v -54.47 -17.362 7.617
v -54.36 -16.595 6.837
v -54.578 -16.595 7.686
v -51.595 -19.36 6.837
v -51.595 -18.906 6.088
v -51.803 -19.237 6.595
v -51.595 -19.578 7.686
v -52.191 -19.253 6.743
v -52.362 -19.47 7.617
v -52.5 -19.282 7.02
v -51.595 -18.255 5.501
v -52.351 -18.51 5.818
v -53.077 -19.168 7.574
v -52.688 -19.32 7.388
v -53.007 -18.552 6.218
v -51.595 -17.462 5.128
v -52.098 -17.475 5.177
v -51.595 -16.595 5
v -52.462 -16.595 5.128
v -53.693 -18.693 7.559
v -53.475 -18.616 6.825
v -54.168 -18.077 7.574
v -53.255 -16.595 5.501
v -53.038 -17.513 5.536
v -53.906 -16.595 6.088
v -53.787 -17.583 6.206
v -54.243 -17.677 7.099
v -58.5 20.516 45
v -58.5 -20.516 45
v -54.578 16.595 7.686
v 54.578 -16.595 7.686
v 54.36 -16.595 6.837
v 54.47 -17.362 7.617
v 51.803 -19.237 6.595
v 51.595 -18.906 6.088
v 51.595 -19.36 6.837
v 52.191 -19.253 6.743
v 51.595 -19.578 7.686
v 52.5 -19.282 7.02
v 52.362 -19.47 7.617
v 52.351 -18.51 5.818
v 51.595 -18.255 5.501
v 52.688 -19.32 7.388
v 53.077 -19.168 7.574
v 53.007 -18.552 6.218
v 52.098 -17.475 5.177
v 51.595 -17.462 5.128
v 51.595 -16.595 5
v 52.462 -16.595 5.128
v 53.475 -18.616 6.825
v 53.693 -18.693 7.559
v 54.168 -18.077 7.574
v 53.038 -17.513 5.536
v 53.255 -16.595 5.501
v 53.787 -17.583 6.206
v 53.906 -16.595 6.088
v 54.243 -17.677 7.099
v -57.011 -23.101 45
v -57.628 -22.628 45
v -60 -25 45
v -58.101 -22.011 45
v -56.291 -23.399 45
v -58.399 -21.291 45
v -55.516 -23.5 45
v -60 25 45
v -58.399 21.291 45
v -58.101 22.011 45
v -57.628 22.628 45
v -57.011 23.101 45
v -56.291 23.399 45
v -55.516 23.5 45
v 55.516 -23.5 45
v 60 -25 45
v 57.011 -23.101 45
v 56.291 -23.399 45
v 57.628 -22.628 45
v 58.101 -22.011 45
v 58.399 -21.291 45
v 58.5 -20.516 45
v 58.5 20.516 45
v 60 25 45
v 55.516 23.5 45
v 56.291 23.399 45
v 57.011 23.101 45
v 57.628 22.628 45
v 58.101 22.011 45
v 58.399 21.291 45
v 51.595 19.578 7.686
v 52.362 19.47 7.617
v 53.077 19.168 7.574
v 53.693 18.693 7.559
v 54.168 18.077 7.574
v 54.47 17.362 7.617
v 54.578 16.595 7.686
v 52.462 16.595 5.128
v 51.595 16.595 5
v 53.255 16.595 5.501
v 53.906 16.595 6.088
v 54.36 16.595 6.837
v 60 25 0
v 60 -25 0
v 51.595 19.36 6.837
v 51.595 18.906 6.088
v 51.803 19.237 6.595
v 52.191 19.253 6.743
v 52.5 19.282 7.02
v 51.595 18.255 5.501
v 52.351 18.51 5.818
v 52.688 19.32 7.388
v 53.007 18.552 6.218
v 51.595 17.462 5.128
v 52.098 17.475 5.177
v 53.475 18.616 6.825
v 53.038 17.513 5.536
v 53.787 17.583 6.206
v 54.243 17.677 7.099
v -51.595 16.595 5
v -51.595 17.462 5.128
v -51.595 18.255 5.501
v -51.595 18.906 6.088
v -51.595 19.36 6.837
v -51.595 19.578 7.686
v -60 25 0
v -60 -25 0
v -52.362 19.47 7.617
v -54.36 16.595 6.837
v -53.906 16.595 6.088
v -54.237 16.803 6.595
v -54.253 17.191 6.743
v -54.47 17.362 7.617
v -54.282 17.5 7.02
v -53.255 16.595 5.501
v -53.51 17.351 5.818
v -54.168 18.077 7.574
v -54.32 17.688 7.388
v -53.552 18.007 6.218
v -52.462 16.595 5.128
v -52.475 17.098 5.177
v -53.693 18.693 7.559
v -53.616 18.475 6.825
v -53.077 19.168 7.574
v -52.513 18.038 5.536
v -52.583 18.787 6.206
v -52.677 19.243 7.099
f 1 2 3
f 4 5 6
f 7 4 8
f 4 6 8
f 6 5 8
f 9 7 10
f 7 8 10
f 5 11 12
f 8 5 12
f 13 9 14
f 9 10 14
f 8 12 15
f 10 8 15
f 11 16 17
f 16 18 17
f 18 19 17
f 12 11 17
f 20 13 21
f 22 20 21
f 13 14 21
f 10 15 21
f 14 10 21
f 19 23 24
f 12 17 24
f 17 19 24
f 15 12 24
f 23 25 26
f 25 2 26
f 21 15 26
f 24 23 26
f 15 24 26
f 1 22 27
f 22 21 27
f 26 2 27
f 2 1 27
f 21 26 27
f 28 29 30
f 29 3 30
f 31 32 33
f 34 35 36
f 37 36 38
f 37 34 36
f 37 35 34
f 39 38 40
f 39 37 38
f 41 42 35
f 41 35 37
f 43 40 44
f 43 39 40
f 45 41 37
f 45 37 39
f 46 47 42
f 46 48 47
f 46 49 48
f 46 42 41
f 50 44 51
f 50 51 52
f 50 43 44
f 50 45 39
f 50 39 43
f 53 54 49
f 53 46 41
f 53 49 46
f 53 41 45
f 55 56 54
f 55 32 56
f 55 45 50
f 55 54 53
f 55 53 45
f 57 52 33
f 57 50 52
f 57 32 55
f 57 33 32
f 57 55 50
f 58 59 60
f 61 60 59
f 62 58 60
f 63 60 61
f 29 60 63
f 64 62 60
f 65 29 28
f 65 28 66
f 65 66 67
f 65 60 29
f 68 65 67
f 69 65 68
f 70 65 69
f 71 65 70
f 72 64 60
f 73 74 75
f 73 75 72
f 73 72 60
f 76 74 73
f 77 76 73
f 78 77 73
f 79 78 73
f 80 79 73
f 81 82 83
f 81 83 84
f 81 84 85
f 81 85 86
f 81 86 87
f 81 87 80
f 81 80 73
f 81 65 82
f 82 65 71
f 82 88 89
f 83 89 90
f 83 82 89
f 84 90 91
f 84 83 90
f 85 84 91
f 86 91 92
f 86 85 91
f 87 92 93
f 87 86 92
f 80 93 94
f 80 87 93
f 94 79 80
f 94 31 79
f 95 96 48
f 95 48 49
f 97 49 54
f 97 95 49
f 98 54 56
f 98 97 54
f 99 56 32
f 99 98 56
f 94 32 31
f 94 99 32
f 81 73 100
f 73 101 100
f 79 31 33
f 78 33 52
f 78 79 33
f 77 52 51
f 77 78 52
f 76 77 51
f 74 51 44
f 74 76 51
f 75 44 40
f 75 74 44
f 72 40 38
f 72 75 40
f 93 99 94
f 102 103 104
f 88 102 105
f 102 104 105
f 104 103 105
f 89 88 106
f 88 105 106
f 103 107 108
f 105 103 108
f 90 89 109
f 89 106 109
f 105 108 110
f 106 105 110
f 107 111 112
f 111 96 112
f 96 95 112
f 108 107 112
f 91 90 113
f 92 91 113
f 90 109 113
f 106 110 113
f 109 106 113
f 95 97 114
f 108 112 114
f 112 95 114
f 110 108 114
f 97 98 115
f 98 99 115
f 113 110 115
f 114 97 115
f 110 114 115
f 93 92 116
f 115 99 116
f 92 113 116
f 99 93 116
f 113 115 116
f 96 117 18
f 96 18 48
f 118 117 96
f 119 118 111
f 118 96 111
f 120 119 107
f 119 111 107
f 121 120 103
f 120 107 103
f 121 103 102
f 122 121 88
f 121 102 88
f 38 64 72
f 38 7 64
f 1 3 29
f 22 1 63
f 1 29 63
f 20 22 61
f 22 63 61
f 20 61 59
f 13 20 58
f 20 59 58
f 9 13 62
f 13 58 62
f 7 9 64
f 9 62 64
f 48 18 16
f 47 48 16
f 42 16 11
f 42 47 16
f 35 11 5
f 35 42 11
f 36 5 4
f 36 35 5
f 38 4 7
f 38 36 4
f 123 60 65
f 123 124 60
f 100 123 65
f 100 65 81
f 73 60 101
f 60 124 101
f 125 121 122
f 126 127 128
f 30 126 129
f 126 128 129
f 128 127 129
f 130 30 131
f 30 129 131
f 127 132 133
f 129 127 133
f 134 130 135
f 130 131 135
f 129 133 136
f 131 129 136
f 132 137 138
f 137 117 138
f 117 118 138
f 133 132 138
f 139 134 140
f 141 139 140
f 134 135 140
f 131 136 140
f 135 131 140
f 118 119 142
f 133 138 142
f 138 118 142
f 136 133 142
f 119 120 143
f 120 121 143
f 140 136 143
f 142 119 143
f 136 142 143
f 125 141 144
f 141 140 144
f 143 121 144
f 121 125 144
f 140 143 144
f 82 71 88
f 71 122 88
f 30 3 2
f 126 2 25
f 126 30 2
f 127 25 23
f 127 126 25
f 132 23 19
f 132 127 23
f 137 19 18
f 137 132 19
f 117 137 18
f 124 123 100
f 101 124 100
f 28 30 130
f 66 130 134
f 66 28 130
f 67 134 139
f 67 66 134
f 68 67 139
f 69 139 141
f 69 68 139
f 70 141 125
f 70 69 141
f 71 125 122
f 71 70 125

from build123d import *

# Parameters (mm, degrees)
SKETCH1_W           = 120
SKETCH1_H           = 50
BOSS_EXTRUDE1_DEPTH = 5
SKETCH2_W           = 120
SKETCH2_H           = 50
SKETCH2_W_2         = 117
SKETCH2_H_2         = 47
BOSS_EXTRUDE3_DEPTH = 40
DRAFT2_ANGLE        = 6
FILLET1_R           = 3


with BuildPart() as part:
    # Sketch1 → Boss-Extrude1 (new body)
    with BuildSketch(Plane.XY):
        Rectangle(SKETCH1_W, SKETCH1_H)
    extrude(amount=BOSS_EXTRUDE1_DEPTH)

    # Sketch2 → Boss-Extrude3 (add)
    with BuildSketch(Plane.XY.offset(5)):
        Rectangle(SKETCH2_W, SKETCH2_H)
        Rectangle(SKETCH2_W_2, SKETCH2_H_2, mode=Mode.SUBTRACT)
    extrude(amount=BOSS_EXTRUDE3_DEPTH)

    # Draft2
    draft2_faces = [part.faces().sort_by_distance(p)[0] for p in [
        (-58.5, 0, 25),
        (0, 23.5, 25),
        (58.5, 0, 25),
        (0, -23.5, 25),
    ]]
    draft(draft2_faces, Plane.XY.offset(45), DRAFT2_ANGLE)

    # Fillet1
    fillet1_edges = [part.edges().sort_by_distance(p)[0] for p in [
        (54.295830589, 0, 5),
        (0, 19.295830589, 5),
        (-54.295830589, 0, 5),
        (0, -19.295830589, 5),
        (56.397915295, 21.397915295, 25),
        (-56.397915295, 21.397915295, 25),
        (-56.397915295, -21.397915295, 25),
        (56.397915295, -21.397915295, 25),
    ]]
    fillet(fillet1_edges, radius=FILLET1_R)


solid = part.part
